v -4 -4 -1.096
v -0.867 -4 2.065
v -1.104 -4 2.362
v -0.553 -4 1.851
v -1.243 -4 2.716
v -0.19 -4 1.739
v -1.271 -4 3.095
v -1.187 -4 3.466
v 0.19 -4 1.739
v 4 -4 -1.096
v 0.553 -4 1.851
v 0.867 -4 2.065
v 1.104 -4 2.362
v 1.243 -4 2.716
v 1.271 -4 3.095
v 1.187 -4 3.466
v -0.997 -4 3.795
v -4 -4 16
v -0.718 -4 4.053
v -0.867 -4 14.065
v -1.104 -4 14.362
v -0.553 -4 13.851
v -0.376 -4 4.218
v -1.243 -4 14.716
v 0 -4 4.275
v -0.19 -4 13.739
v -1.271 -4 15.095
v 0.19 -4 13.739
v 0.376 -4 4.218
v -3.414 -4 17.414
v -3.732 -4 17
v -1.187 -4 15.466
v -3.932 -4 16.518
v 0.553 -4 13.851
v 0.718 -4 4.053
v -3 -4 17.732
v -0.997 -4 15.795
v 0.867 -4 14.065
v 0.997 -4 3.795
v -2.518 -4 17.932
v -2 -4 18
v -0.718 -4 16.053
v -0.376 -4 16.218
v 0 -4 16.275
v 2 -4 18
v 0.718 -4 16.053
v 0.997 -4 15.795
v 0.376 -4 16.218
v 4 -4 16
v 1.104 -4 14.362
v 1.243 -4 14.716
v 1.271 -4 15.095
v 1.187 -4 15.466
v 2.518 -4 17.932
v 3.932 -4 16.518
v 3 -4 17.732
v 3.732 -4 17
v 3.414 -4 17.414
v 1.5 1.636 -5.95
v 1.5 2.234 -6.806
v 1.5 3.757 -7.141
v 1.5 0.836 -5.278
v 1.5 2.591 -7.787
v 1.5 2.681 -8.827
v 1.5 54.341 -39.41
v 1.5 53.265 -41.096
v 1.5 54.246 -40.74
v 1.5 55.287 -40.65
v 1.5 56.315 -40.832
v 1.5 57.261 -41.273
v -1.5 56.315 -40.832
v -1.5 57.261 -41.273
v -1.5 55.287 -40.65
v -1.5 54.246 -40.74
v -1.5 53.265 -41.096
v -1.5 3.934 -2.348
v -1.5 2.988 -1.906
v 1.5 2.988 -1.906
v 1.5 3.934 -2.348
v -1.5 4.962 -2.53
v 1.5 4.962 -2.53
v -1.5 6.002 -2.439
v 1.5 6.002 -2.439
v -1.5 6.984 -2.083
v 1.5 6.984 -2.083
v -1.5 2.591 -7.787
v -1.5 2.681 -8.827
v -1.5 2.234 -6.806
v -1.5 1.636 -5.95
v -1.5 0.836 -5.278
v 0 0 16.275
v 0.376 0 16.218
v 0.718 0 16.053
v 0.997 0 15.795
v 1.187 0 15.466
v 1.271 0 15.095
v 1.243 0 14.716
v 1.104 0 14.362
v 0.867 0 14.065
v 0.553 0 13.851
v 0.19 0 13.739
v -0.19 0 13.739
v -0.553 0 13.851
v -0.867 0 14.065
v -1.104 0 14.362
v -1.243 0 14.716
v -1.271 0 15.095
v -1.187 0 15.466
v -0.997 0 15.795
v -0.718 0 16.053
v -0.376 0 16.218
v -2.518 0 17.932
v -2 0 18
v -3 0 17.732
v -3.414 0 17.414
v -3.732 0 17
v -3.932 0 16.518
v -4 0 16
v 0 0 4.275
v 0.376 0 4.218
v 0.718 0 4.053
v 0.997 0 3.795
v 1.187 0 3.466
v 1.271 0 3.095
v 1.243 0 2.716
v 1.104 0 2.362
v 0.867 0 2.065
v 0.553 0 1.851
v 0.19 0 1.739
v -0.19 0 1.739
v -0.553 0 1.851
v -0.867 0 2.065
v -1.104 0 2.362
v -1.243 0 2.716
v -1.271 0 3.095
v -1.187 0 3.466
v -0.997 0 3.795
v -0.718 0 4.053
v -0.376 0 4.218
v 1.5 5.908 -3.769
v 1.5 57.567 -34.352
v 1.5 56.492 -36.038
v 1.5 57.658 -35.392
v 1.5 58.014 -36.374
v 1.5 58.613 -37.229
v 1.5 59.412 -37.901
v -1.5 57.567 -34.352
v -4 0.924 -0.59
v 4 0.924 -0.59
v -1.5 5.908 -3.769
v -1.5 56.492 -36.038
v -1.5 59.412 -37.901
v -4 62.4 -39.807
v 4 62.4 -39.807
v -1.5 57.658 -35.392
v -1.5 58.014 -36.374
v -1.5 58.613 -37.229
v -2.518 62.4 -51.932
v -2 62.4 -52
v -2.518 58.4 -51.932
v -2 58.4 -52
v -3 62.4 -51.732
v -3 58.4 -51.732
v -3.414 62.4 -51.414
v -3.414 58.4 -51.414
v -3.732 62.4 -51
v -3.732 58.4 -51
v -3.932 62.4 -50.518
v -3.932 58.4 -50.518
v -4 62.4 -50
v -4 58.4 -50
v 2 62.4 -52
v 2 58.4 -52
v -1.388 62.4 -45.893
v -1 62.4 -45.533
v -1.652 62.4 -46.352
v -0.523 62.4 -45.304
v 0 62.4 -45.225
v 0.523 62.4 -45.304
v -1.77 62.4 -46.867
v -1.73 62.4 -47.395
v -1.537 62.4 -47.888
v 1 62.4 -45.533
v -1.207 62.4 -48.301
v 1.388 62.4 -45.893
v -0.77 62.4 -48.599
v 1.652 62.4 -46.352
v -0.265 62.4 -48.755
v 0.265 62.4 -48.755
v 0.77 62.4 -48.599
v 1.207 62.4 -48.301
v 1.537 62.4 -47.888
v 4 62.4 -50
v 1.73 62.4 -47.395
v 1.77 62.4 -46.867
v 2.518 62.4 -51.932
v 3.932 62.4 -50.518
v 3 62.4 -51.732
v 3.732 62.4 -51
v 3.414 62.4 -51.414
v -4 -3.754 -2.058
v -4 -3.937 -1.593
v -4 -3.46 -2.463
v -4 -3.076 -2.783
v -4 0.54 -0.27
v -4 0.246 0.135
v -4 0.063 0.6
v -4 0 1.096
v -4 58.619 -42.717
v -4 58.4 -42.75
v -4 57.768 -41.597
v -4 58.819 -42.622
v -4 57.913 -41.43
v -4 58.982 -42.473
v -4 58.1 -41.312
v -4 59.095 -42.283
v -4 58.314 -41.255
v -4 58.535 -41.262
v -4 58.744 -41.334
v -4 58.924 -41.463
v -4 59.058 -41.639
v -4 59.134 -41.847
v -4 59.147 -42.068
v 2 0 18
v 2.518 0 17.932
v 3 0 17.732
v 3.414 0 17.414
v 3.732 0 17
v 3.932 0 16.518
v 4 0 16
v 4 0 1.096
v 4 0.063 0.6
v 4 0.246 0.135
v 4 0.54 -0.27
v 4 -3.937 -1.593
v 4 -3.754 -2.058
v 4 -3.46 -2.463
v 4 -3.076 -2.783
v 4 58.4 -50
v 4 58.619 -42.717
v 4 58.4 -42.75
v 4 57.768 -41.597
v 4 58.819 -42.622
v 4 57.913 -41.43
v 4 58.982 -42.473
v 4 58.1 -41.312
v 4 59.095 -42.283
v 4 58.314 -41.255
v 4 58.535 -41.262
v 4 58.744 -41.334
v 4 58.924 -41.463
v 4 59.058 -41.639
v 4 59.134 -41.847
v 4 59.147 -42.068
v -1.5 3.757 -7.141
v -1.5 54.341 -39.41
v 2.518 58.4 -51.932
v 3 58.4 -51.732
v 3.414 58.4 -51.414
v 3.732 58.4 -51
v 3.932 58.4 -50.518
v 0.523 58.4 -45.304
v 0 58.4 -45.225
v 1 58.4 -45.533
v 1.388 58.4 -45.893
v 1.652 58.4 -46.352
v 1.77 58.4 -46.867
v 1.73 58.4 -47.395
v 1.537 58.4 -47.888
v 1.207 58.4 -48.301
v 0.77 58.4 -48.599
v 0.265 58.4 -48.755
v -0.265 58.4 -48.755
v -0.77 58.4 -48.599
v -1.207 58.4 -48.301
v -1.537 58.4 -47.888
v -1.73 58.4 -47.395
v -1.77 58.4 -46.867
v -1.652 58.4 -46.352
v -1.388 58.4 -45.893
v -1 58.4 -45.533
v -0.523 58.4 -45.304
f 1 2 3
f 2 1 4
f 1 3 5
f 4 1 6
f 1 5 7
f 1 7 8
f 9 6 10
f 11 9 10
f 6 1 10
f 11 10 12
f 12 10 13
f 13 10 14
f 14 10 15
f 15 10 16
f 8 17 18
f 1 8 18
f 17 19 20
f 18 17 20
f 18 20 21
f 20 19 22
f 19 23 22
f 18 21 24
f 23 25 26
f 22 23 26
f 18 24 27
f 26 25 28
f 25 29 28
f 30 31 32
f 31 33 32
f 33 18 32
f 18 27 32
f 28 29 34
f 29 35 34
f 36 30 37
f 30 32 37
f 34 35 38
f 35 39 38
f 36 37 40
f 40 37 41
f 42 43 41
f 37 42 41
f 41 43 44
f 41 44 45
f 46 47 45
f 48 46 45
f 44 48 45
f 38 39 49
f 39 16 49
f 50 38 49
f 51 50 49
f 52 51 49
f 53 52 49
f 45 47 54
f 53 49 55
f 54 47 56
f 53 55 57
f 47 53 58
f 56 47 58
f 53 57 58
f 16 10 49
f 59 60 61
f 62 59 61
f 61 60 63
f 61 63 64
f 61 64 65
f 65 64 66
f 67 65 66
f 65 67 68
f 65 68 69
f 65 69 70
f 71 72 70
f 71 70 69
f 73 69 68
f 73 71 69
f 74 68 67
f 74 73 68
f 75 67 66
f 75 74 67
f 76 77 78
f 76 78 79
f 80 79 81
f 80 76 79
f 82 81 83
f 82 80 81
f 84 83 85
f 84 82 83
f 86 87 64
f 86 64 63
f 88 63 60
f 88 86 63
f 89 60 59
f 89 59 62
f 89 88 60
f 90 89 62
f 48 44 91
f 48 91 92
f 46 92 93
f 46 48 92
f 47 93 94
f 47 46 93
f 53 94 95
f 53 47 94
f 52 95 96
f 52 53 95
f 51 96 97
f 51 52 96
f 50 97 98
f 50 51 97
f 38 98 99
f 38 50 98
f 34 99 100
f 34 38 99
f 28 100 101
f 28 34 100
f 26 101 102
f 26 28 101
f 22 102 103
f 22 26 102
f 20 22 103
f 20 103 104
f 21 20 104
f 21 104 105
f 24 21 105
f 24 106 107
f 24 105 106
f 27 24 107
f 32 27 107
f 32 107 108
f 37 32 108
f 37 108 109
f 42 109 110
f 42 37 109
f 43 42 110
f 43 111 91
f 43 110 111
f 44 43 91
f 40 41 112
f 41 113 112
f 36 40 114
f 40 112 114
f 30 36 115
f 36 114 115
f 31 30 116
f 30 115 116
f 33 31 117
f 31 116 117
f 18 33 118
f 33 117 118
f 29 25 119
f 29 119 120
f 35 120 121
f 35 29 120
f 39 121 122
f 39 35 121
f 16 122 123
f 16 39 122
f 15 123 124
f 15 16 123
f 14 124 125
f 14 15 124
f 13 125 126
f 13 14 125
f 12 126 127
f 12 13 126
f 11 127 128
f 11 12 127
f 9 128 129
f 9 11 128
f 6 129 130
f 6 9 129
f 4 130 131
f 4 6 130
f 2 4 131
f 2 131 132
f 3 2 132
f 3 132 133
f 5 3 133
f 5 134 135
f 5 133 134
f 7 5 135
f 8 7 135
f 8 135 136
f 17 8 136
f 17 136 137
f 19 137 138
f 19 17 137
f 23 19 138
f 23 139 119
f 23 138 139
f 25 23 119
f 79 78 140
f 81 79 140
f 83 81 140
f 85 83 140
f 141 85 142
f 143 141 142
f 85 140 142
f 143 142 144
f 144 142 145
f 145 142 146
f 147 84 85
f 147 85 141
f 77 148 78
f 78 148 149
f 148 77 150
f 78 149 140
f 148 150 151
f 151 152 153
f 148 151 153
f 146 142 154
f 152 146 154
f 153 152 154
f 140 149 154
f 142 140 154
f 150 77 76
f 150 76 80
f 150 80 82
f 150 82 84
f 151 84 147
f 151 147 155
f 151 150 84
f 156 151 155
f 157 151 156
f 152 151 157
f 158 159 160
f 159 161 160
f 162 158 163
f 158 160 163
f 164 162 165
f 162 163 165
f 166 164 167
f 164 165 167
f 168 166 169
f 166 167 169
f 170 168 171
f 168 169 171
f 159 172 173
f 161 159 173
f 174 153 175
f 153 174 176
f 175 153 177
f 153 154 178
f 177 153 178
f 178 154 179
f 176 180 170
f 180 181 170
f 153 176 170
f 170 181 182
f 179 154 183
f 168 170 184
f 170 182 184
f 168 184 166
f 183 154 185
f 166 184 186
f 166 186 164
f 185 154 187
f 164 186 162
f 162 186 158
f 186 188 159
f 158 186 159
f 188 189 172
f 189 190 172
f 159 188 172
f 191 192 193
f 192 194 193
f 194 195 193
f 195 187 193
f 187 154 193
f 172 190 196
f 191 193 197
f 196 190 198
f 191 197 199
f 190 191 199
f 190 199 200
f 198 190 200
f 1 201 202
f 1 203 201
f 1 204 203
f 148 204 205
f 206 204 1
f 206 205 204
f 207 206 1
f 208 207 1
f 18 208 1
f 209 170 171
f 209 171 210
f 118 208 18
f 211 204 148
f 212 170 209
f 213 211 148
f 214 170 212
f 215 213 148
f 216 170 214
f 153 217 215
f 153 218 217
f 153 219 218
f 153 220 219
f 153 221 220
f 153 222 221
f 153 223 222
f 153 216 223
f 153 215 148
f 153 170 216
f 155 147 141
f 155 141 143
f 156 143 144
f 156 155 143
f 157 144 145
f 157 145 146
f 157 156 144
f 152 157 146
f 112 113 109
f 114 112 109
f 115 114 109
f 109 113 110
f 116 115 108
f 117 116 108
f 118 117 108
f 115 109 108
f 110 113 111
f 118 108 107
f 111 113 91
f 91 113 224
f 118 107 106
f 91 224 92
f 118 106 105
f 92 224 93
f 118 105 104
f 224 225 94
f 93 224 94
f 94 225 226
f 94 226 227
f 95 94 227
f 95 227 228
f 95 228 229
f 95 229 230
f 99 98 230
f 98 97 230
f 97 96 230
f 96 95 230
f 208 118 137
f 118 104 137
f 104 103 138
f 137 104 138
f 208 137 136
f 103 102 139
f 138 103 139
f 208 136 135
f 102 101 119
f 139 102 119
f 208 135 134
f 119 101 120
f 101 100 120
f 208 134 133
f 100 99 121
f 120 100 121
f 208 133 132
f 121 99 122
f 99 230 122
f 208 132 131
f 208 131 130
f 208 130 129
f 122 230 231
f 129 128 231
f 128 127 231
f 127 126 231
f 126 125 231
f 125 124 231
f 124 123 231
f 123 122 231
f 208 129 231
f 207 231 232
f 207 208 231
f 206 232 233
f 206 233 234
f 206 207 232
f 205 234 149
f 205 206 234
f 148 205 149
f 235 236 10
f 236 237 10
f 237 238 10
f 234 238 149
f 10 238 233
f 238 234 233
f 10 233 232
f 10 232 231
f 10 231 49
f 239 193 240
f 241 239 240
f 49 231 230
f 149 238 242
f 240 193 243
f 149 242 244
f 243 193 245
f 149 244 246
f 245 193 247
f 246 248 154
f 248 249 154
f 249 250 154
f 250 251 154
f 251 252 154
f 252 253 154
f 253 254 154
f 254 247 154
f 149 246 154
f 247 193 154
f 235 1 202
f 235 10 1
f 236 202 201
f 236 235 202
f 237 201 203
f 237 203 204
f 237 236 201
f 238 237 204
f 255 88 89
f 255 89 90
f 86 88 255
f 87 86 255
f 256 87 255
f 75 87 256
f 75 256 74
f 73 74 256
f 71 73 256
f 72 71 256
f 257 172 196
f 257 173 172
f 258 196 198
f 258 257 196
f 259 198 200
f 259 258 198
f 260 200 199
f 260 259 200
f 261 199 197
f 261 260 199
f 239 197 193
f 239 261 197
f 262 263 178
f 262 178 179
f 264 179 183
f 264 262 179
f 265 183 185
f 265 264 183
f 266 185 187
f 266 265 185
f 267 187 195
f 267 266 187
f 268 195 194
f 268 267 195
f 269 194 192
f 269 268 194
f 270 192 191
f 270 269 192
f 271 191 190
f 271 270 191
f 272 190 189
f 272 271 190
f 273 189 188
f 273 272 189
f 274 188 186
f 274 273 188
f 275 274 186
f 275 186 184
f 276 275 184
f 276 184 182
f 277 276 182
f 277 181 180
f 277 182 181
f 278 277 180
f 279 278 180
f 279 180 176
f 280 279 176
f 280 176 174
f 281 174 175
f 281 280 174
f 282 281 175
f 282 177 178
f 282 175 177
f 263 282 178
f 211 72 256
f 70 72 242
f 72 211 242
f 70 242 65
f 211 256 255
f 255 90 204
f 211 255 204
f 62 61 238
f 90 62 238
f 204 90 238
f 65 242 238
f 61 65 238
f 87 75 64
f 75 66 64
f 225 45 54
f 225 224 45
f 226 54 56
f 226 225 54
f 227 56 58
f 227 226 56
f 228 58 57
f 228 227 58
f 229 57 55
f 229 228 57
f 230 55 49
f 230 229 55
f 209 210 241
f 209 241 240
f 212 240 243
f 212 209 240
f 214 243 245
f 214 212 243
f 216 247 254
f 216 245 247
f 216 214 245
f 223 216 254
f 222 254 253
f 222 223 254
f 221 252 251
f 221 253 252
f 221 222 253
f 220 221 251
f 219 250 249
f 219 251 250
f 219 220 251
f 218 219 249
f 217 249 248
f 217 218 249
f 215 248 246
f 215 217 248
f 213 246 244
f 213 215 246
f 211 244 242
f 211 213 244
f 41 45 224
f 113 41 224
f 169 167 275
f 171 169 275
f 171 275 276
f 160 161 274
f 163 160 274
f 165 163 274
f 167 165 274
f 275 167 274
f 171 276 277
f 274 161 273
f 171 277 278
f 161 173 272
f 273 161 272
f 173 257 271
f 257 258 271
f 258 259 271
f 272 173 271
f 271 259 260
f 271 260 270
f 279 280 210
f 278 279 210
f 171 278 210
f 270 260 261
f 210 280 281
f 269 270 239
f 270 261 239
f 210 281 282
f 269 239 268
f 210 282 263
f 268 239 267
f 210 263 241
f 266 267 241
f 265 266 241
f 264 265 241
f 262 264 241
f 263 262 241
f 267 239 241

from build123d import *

# Parameters (mm, degrees)
EXTRUDE_1_DEPTH          = 4
CUT_EXTRUDE_1_DEPTH      = 82.325026898
CUT_EXTRUDE_1_DEPTH_BACK = 82.325026898
SKETCH_2_R               = 1.275
CUT_EXTRUDE_2_DEPTH      = 85.433168838
CUT_EXTRUDE_2_DEPTH_BACK = 85.433168838
SKETCH_3_R               = 1.775
EXTRUDE_2_DEPTH          = 1.5
CUT_EXTRUDE_3_DEPTH      = 82.619605488
CUT_EXTRUDE_3_DEPTH_BACK = 82.619605488
SKETCH_5_R               = 0.75
FILLET_2_R               = 4
FILLET_3_R               = 2
FILLET_4_R               = 2


with BuildPart() as part:
    # 草图1 → 凸台-拉伸1 (new, symmetric)
    with BuildSketch(Plane(origin=(0, 0, 0), x_dir=(0, 0, -1), z_dir=(1, 0, 0))):
        Polygon((-18, 0), (0, 0), (39.807123819, 62.4), (52, 62.4), (52, 58.4), (42, 58.4), (2.192876181, -4), (-18, -4), align=None)
    extrude(amount=EXTRUDE_1_DEPTH, both=True)

    # 草图2 → 切除-拉伸1 (cut, two sides: drawn at the far end of the back side and taken through both)
    with BuildSketch(Plane(origin=(0, 0, 0), x_dir=(1, 0, 0), z_dir=(0, 1, 0)).offset(-CUT_EXTRUDE_1_DEPTH_BACK)):
        with Locations(Location((0, -3, 0), (0, 0, 270))):
            Circle(SKETCH_2_R)
        with Locations(Location((0, -15, 0), (0, 0, 270))):
            Circle(SKETCH_2_R)
    extrude(amount=CUT_EXTRUDE_1_DEPTH + CUT_EXTRUDE_1_DEPTH_BACK, mode=Mode.SUBTRACT)

    # 草图3 → 切除-拉伸2 (cut, two sides: drawn at the far end of the back side and taken through both)
    with BuildSketch(Plane(origin=(0, 62.4, 0), x_dir=(1, 0, 0), z_dir=(0, 1, 0)).offset(-CUT_EXTRUDE_2_DEPTH_BACK)):
        with Locations(Location((0, 47, 0), (0, 0, 270))):
            Circle(SKETCH_3_R)
    extrude(amount=CUT_EXTRUDE_2_DEPTH + CUT_EXTRUDE_2_DEPTH_BACK, mode=Mode.SUBTRACT)

    # 草图4 → 凸台-拉伸2 (add, symmetric)
    with BuildSketch(Plane(origin=(0, 0, 0), x_dir=(0, 0, -1), z_dir=(1, 0, 0))):
        Polygon((3.769025595, 5.908168553), (2.082903499, 6.983804308), (34.351976128, 57.567467201), (36.038098224, 56.491831447), align=None)
        Polygon((39.410342417, 54.340559938), (41.096464513, 53.264924184), (8.827391885, 2.681261291), (7.141269788, 3.756897045), align=None)
    extrude(amount=EXTRUDE_2_DEPTH, both=True)

    # 草图5 → 切除-拉伸3 (cut, two sides: drawn at the far end of the back side and taken through both)
    with BuildSketch(Plane(origin=(4, 0, 0), x_dir=(0, 0, -1), z_dir=(1, 0, 0)).offset(-CUT_EXTRUDE_3_DEPTH_BACK)):
        with Locations((42, 58.4)):
            Circle(SKETCH_5_R)
    extrude(amount=CUT_EXTRUDE_3_DEPTH + CUT_EXTRUDE_3_DEPTH_BACK, mode=Mode.SUBTRACT)

    # 圆角2
    # the kernel refuses this fillet: 4 mm, written as the material it adds along each edge
    with BuildSketch(Plane(origin=(-1.5, 3.756897045, -7.141269788), x_dir=(0, -0.8430610482191677, 0.5378178771439251), z_dir=(1, 0, 0)), Plane(origin=(-1.5, 56.491831447, -36.038098224), x_dir=(0, 0.8430610482191674, -0.5378178771439257), z_dir=(1, 0, 0))) as fillet_2_piece_1:
        with BuildLine():
            CenterArc((3.464101615, 4), FILLET_2_R, 210, 60)
            Line((0, 2), (-0.069282032, 1.96))
            ThreePointArc((-0.069282032, 1.96), (-0.08, 1), (-0.08, 0))
            Line((-0.08, 0), (0, -0.08))
            Line((0, -0.08), (3.464101615, -0.08))
            Line((3.464101615, -0.08), (3.464101615, 0))
        make_face()
    extrude(amount=3)
    with BuildSketch(Plane(origin=(-1.5, 5.908168553, -3.769025595), x_dir=(0, -0.8430610482191704, 0.5378178771439209), z_dir=(1, 0, 0)), Plane(origin=(-1.5, 54.340559938, -39.410342417), x_dir=(0, 0.8430610482191698, -0.5378178771439218), z_dir=(1, 0, 0))) as fillet_2_piece_2:
        with BuildLine():
            CenterArc((3.464101615, -4), FILLET_2_R, 90, 60)
            Line((0, -2), (-0.069282032, -1.96))
            ThreePointArc((-0.069282032, -1.96), (-0.08, -1), (-0.08, 0))
            Line((-0.08, 0), (0, 0.08))
            Line((0, 0.08), (3.464101615, 0.08))
            Line((3.464101615, 0.08), (3.464101615, 0))
        make_face()
    extrude(amount=3)

    # 圆角3
    fillet_3_edges = [part.edges().sort_by_distance(p)[0] for p in [
        (-4, -2, 18),
        (4, 60.4, -52),
        (4, -2, 18),
        (-4, 60.4, -52),
    ]]
    fillet(fillet_3_edges, radius=FILLET_3_R)

    # 圆角4
    fillet_4_edges = [part.edges().sort_by_distance(p)[0] for p in [
        (0, 0, 0),
        (0, -4, -2.192876181),
    ]]
    fillet(fillet_4_edges, radius=FILLET_4_R)


solid = part.part
